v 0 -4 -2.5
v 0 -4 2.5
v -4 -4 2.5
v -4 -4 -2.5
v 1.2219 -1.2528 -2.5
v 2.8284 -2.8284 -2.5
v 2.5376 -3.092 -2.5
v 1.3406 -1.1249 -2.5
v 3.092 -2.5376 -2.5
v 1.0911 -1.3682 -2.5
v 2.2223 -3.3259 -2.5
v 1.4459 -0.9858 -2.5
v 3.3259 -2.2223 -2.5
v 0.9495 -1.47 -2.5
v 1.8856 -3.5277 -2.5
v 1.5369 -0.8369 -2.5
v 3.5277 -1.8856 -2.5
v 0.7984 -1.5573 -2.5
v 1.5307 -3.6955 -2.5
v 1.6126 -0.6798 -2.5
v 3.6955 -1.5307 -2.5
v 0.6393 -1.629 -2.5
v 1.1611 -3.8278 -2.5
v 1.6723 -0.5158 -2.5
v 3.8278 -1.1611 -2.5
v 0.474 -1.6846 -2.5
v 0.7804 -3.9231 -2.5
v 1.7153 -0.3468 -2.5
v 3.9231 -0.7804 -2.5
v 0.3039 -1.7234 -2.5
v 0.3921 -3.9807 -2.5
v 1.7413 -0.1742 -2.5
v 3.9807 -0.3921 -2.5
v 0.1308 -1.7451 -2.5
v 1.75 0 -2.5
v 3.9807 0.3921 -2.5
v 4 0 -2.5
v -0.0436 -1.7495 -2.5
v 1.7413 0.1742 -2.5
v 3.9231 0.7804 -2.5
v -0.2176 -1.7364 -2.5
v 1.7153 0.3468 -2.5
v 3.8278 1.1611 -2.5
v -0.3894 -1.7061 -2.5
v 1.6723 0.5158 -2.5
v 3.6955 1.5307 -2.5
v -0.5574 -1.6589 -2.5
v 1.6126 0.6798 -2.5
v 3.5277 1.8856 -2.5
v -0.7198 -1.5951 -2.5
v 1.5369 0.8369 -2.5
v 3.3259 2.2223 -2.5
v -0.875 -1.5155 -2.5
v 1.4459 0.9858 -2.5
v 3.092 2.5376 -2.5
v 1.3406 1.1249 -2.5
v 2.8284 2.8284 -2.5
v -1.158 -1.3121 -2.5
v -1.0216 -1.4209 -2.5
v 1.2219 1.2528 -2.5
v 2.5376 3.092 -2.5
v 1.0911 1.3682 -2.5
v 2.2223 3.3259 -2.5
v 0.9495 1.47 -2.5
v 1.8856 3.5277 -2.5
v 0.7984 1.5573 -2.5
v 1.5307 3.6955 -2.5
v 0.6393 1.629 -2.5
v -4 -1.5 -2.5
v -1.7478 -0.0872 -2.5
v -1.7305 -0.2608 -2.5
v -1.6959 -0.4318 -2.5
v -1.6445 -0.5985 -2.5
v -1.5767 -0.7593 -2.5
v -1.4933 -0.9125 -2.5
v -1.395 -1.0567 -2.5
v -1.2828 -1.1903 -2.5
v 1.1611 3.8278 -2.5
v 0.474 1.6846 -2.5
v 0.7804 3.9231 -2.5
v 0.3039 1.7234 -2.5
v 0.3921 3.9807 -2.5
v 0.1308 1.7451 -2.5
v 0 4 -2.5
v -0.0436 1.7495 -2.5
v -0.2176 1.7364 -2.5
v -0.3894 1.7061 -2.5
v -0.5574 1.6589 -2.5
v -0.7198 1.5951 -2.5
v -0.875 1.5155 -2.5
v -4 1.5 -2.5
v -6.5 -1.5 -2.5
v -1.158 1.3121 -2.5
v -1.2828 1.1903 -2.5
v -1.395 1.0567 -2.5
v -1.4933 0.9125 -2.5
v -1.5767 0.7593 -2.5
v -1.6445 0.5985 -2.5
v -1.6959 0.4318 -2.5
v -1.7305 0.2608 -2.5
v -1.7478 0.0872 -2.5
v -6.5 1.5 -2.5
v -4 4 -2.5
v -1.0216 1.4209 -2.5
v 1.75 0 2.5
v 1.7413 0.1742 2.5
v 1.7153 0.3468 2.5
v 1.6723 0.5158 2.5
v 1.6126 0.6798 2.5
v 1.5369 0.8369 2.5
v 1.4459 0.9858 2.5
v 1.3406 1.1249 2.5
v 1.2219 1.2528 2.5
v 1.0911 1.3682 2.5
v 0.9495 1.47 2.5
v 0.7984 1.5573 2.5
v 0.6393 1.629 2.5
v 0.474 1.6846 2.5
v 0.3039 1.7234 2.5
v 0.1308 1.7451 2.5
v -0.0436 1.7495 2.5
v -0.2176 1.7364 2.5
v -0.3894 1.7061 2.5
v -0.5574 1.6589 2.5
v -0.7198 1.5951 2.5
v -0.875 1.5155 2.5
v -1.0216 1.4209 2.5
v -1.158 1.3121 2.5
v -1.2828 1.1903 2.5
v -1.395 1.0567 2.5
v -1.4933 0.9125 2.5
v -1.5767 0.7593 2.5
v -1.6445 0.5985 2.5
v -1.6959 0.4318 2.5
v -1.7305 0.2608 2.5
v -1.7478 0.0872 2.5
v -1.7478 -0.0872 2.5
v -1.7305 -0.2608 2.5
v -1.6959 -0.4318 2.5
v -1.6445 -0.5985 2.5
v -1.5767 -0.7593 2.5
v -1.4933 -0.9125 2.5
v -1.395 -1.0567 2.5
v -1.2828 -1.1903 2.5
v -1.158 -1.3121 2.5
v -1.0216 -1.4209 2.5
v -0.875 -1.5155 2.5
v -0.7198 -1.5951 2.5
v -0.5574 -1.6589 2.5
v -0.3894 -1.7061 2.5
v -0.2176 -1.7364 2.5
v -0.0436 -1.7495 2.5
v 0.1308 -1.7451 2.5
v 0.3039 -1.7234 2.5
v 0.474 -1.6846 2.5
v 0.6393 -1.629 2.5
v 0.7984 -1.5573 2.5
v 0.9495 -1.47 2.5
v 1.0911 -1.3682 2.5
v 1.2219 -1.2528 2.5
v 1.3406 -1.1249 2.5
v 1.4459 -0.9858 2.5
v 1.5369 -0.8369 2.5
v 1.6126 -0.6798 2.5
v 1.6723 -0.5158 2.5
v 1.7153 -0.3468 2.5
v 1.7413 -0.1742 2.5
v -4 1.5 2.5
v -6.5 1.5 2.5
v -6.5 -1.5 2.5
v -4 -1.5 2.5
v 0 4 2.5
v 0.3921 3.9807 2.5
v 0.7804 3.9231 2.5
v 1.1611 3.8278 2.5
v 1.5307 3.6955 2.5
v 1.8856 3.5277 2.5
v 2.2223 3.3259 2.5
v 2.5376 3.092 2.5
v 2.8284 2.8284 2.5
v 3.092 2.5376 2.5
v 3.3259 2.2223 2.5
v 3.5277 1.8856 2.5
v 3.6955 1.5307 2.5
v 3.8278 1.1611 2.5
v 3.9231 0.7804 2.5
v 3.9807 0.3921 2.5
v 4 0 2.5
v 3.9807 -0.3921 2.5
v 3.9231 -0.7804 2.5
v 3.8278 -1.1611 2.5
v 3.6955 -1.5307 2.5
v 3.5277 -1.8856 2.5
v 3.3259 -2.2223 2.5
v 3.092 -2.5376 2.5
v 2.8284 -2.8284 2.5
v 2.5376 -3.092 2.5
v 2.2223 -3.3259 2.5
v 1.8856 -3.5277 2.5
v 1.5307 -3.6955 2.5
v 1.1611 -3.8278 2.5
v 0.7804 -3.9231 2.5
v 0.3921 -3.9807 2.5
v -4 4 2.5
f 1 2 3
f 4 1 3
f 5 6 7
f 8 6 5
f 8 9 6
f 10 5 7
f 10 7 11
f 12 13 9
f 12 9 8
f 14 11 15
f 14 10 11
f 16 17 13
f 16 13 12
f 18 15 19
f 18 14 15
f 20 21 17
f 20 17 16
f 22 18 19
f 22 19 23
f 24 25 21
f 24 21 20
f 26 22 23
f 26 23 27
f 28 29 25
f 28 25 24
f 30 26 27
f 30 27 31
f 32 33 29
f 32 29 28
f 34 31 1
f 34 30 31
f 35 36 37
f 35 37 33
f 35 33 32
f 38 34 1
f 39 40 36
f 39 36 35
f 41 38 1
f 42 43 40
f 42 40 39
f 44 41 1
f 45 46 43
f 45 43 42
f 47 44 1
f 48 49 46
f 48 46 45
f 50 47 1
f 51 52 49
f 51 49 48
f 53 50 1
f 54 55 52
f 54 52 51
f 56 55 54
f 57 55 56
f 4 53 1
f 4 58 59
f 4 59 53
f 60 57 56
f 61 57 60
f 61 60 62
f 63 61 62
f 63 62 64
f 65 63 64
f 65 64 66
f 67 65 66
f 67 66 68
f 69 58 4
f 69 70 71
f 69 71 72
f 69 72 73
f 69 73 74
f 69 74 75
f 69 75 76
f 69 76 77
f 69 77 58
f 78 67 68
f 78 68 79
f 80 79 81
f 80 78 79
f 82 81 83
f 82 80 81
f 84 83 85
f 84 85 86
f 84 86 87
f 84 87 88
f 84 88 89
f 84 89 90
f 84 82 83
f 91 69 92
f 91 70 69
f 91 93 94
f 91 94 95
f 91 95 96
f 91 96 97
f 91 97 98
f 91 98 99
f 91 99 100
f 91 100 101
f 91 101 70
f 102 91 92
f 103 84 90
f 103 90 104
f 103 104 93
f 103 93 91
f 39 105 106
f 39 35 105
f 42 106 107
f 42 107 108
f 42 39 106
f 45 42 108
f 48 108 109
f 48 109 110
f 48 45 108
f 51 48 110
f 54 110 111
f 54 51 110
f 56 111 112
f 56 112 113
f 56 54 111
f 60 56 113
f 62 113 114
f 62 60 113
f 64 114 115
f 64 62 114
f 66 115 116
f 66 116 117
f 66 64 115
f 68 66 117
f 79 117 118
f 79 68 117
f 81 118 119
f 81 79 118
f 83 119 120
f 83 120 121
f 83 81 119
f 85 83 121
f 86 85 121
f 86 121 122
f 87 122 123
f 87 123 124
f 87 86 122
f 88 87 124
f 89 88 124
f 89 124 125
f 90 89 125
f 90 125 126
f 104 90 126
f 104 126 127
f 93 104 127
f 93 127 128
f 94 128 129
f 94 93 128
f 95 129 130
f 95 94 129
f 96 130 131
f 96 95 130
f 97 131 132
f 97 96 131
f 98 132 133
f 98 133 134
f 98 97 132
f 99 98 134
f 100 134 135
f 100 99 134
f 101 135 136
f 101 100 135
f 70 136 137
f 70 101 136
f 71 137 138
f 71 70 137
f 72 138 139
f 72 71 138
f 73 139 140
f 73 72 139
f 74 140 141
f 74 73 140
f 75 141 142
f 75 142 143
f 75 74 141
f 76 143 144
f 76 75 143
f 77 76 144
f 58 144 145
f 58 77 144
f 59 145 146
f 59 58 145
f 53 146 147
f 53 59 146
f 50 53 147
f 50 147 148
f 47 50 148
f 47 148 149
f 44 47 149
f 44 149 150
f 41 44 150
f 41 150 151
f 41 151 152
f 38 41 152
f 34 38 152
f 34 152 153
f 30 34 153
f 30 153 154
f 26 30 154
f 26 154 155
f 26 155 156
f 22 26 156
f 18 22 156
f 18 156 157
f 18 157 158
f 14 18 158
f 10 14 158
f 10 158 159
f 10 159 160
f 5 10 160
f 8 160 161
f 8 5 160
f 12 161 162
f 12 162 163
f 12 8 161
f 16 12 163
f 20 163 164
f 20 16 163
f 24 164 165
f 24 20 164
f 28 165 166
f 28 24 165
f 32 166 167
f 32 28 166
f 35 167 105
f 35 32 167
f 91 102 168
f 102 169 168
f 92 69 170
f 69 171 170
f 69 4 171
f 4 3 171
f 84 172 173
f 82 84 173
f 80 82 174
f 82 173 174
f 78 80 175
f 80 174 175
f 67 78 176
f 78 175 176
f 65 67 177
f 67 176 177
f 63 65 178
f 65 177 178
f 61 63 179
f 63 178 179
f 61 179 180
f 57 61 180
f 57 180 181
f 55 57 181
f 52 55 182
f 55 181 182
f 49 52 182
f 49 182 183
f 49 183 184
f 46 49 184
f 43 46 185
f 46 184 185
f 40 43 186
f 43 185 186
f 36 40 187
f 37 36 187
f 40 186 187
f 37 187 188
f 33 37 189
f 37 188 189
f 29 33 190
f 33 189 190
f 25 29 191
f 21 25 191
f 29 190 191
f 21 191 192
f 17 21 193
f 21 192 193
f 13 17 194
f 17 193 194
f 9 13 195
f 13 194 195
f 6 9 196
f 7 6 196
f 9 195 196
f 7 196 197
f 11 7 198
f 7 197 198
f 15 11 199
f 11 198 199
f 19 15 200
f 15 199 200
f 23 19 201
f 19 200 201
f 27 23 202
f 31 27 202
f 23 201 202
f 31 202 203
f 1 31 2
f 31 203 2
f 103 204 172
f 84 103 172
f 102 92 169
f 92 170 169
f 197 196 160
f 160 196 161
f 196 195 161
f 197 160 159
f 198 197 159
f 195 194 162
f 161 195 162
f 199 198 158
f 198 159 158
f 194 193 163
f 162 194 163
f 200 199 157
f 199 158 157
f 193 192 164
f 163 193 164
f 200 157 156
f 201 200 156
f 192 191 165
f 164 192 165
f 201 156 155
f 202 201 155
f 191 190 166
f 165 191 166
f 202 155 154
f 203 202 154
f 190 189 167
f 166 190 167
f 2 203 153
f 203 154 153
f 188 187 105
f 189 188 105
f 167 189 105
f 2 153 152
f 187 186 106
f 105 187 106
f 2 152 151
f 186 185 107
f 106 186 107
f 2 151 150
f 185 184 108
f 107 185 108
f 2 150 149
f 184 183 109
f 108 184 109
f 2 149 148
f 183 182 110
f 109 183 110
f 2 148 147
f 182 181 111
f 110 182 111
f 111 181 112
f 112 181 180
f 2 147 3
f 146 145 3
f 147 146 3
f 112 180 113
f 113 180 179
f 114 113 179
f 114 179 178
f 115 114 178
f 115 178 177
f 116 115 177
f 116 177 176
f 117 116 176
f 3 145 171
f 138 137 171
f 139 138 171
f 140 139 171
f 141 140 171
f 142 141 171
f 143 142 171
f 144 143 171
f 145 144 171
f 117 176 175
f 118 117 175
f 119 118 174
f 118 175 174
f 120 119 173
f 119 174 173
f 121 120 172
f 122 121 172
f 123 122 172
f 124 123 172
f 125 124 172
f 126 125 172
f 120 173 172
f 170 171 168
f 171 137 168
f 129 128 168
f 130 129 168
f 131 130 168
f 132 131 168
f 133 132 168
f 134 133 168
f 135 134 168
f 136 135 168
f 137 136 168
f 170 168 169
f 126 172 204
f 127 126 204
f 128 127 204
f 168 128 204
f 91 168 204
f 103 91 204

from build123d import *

# Parameters (mm, degrees)
CROQUIS1_R              = 1.75
SALIENTE_EXTRUIR1_DEPTH = 2.5


with BuildPart() as part:
    # Croquis1 → Saliente-Extruir1 (new, symmetric)
    with BuildSketch(Plane.XY):
        with BuildLine():
            Line((0, -4), (-4, -4))
            Line((-4, -4), (-4, -1.5))
            Line((-4, -1.5), (-6.5, -1.5))
            Line((-6.5, -1.5), (-6.5, 1.5))
            Line((-6.5, 1.5), (-4, 1.5))
            Line((-4, 1.5), (-4, 4))
            Line((-4, 4), (0, 4))
            ThreePointArc((0, 4), (4, 0), (0, -4))
        make_face()
        Circle(CROQUIS1_R, mode=Mode.SUBTRACT)
    extrude(amount=SALIENTE_EXTRUIR1_DEPTH, both=True)


solid = part.part
